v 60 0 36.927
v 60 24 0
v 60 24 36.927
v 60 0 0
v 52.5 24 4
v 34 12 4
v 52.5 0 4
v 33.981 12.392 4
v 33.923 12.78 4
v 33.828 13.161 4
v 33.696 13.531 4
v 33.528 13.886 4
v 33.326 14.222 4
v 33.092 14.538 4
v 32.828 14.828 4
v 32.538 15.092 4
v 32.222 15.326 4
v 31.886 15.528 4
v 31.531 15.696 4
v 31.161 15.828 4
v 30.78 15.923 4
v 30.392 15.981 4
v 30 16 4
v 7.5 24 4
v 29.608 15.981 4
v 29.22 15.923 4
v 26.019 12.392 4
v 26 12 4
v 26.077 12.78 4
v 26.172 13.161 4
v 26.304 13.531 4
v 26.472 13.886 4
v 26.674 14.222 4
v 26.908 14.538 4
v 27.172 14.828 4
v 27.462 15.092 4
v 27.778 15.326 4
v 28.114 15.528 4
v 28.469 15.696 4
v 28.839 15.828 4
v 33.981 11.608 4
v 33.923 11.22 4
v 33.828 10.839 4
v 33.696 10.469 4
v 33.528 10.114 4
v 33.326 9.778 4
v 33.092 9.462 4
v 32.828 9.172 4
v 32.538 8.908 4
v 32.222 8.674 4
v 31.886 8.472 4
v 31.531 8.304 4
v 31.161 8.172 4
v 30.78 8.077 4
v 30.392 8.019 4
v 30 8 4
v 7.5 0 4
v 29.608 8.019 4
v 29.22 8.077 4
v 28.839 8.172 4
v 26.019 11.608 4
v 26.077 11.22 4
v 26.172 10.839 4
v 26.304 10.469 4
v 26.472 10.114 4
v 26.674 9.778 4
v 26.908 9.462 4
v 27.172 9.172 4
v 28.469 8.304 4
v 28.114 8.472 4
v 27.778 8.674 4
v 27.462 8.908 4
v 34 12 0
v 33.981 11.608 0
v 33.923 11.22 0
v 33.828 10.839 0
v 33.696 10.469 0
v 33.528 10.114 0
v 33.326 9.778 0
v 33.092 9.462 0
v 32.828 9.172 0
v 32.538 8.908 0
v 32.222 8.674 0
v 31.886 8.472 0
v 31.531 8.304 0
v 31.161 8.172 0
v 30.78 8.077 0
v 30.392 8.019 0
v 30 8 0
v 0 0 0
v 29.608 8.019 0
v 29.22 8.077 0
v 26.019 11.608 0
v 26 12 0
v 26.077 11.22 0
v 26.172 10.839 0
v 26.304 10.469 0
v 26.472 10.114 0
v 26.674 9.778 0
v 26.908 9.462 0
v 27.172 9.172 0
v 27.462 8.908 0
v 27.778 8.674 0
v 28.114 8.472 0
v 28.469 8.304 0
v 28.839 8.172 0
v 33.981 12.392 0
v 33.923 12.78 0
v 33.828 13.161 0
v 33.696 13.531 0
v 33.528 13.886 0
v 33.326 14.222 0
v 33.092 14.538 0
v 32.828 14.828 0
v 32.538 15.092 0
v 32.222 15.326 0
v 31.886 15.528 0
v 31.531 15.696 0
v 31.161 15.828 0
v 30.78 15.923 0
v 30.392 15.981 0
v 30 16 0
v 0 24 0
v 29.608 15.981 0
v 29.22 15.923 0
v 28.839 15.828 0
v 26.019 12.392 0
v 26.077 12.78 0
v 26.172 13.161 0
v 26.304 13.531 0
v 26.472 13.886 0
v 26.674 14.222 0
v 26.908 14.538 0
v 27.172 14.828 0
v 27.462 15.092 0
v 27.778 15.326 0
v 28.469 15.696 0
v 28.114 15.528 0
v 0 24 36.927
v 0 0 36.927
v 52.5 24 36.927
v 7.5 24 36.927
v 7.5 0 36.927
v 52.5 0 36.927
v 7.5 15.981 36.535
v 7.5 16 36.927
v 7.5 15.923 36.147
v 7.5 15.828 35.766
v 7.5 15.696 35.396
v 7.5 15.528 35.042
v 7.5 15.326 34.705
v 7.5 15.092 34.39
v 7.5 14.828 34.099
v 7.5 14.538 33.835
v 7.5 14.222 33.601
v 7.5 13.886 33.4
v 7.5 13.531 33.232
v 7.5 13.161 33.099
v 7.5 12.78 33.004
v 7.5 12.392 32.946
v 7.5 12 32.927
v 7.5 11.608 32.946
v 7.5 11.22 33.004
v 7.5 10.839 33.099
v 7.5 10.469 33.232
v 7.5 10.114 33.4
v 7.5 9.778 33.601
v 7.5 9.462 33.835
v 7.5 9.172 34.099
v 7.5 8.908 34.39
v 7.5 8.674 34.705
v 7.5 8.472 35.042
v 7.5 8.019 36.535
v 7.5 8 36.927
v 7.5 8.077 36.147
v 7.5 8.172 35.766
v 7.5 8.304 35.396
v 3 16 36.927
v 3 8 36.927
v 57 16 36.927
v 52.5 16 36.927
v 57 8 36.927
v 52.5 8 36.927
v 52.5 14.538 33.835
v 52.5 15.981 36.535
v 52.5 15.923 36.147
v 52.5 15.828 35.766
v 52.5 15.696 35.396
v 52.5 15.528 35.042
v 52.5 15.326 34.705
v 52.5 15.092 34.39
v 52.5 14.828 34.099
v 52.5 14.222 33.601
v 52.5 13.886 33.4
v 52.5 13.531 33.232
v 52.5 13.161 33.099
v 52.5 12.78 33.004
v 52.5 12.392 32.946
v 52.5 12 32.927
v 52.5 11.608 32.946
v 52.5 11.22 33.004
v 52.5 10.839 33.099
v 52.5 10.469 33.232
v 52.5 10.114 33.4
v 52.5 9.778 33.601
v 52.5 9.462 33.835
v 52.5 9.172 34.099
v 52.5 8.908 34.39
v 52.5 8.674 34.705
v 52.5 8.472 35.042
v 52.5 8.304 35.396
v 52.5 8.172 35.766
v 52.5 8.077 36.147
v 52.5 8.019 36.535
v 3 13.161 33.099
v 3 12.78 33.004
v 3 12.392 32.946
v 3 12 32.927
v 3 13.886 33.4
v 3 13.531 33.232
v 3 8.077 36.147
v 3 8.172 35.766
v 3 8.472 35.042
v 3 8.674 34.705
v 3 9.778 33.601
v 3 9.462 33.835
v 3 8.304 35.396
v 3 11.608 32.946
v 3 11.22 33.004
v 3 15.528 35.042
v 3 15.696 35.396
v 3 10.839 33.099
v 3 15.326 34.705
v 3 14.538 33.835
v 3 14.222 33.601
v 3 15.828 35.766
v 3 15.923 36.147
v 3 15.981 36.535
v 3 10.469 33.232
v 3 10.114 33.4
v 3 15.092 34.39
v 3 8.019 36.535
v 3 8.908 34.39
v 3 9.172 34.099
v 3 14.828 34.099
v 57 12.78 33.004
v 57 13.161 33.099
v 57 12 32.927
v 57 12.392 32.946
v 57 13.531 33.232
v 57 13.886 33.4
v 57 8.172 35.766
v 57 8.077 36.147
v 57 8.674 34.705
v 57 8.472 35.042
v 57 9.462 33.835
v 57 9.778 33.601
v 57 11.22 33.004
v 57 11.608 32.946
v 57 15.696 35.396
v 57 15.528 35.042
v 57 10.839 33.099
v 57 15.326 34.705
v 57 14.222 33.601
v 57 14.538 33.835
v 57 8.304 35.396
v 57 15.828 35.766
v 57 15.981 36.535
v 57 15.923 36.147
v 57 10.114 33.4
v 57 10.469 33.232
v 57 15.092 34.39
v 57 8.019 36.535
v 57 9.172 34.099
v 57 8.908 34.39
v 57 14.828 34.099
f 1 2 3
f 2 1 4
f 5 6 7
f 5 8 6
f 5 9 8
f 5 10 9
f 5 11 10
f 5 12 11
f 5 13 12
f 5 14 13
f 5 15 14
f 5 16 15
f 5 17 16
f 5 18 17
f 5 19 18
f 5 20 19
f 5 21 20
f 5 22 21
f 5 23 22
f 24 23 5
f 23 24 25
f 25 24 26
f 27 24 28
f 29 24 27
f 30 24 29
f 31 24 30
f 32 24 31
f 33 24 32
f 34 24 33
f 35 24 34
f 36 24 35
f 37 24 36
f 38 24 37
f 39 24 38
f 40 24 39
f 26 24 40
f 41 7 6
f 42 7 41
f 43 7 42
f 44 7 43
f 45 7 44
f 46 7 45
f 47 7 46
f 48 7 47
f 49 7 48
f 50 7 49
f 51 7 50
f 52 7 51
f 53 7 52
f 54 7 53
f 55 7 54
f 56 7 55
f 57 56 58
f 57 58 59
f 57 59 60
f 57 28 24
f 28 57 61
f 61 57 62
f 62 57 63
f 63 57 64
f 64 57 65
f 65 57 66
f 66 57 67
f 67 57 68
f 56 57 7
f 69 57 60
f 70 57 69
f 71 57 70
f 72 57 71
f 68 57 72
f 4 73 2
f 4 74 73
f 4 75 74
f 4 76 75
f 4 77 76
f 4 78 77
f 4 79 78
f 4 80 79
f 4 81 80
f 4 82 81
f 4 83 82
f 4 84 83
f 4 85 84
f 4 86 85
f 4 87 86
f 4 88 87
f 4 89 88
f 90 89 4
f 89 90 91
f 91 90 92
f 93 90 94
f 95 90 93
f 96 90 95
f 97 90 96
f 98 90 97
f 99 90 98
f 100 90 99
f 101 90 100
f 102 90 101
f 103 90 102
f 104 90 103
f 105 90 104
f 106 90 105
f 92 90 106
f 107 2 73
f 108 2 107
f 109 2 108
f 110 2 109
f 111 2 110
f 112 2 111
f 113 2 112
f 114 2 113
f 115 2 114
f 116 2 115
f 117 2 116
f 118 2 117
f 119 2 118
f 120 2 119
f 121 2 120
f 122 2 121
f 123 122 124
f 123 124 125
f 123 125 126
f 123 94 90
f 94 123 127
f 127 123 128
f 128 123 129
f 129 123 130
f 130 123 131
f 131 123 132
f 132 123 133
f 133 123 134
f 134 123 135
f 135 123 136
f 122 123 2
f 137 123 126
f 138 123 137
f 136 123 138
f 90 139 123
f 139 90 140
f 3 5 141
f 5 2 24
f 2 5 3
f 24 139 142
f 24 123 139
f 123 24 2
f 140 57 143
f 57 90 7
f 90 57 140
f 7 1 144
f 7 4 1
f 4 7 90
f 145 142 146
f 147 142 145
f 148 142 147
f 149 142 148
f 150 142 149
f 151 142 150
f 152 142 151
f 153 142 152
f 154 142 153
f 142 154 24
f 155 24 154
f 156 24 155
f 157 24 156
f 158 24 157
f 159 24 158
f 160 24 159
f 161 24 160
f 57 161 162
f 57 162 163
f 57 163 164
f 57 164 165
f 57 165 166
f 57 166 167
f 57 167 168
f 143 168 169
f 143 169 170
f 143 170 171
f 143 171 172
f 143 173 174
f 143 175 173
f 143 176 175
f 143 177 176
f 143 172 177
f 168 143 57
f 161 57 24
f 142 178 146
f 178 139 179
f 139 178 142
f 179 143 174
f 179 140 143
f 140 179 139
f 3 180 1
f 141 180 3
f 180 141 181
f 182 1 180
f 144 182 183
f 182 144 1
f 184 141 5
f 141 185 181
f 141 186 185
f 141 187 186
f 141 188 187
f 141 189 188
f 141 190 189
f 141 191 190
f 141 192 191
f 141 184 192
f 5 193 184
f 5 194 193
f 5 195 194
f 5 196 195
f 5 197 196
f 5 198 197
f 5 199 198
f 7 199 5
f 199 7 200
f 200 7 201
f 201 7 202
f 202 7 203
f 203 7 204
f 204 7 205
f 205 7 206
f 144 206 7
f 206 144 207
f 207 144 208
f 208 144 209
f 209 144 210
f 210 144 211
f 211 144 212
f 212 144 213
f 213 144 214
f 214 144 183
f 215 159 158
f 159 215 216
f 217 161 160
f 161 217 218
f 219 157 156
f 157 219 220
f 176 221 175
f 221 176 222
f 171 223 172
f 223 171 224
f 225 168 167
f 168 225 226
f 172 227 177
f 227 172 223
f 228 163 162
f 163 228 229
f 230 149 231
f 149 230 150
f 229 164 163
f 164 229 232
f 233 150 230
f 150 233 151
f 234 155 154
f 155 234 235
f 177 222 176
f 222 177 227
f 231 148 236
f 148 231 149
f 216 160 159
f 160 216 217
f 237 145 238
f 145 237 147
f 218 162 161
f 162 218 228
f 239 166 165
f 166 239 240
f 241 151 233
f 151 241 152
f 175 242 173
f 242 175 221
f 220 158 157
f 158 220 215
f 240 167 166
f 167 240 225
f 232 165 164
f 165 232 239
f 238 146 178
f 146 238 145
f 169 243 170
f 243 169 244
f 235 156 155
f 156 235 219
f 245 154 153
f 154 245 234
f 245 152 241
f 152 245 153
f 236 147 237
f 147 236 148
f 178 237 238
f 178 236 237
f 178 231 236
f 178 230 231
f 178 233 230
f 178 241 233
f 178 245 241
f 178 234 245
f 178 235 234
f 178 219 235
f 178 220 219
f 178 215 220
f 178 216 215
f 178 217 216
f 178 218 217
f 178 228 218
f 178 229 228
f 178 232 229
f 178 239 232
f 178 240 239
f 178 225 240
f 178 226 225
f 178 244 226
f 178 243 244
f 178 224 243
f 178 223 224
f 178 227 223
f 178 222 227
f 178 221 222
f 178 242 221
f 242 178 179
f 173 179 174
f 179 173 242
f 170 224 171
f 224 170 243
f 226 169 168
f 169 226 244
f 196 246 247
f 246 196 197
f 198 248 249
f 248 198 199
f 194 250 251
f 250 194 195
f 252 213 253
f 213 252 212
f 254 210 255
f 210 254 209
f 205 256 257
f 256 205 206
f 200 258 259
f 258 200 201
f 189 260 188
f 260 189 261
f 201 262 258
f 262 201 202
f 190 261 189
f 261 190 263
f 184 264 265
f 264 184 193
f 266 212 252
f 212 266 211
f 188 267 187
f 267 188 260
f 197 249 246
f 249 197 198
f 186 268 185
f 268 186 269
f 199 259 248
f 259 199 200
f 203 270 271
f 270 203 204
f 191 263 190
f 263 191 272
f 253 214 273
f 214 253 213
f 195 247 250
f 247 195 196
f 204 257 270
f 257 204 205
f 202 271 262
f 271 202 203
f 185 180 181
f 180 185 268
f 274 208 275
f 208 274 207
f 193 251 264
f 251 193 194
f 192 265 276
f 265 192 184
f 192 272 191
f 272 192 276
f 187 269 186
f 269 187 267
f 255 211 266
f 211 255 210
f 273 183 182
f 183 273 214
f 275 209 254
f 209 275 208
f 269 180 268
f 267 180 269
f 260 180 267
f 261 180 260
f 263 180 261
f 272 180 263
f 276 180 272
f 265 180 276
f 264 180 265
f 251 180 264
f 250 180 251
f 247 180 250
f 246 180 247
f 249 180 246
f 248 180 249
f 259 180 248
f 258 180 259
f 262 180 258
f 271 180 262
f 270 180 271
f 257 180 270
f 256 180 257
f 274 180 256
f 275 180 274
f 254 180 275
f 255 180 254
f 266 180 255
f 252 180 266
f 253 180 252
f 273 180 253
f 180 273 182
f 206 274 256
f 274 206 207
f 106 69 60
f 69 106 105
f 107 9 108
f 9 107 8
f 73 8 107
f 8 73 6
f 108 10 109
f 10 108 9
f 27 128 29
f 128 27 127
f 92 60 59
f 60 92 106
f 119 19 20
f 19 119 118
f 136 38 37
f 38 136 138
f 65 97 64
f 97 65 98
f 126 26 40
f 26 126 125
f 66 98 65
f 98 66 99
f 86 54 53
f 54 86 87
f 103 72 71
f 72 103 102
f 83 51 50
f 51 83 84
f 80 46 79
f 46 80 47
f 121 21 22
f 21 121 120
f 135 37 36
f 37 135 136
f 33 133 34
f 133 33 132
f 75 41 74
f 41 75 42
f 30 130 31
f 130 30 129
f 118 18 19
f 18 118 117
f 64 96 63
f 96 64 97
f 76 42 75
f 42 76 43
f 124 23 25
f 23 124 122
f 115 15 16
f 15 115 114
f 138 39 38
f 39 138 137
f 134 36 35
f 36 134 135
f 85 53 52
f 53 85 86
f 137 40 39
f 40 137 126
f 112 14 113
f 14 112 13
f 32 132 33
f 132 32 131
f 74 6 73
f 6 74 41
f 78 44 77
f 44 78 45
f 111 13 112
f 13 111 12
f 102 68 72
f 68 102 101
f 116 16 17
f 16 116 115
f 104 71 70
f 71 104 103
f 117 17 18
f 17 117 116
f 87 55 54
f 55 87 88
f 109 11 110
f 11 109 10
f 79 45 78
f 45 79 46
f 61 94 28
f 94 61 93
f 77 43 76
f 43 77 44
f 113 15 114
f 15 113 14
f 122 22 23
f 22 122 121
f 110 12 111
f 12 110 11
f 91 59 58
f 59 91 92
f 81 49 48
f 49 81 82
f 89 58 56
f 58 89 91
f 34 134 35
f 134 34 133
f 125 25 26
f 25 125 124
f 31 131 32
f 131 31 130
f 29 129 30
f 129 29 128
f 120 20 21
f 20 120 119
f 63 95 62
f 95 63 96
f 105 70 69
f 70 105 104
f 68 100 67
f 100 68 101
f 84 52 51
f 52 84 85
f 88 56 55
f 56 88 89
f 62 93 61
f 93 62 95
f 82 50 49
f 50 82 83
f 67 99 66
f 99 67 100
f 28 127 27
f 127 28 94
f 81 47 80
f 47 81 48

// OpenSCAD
BASE_X = 60;
BASE_Y = 24;
BASE_Z = 4;

WALL_X = 7.5;
WALL_Y = BASE_Y;
WALL_Z = 36.9272;

AXIS_H = 4.5;
AXIS_R = 4;
MARGIN = 1;
FN = 64;

SLOT_H = 3;
HOLE3_H = 2.5;

SCREWS_H = 6;
SCREWS_Z = 1;

difference () {
    // U shape base
    union () {
        // Base
        cube([BASE_X, BASE_Y, BASE_Z]);
        
        // Walls
        cube([WALL_X, WALL_Y, WALL_Z]);
        translate ([BASE_X - WALL_X, 0, 0]) {
            cube([WALL_X, WALL_Y, WALL_Z]);
        }
    }
    
    union () {
        // Axis holes
        // Left
        translate ([WALL_X - AXIS_H, WALL_Y / 2.0, WALL_Z]) {
            rotate ([0, 90, 0]) {
                cylinder (AXIS_H + MARGIN, AXIS_R, AXIS_R, $fn=FN);
            }
        }
        // Right
        translate ([BASE_X - WALL_X - MARGIN, WALL_Y / 2.0, WALL_Z]) {
            rotate ([0, 90, 0]) {
                cylinder (AXIS_H + MARGIN, AXIS_R, AXIS_R, $fn=FN);
            }
        }
    
        // Servo hole
        // Base (cylinder shape)
        translate ([BASE_X / 2.0, BASE_Y / 2.0, -MARGIN]) {
            cylinder (BASE_Z + 2 * MARGIN, AXIS_R, AXIS_R, $fn=FN);
        }
        // "Propeller" shape
        translate ([BASE_X / 2.0, BASE_Y / 2.0, 1.7]) {
            linear_extrude(height = BASE_Z) {
                import(file = "../drawings/camera.dxf",
                    layer = "openscad-servo-hole2", $fn=FN);
            }
        }
    
        // Long servo hole
        translate ([BASE_X - 5.5, 0, 0]) {
            rotate ([0, 0, 90]) {
                rotate ([90, 0, 0]) {
                    linear_extrude(height = HOLE3_H) {
                        import(file = "../drawings/camera.dxf",
                            layer = "openscad-servo-hole3", $fn=FN);
                    }
                }
            }
        }
        
        // Cover screws
        translate ([0, 0, SCREWS_Z]) {
            linear_extrude(height = SCREWS_H) {
                import(file = "../drawings/camera.dxf",
                        layer = "openscad-servo-screws2", $fn=FN);
            }
        }
    }
}
